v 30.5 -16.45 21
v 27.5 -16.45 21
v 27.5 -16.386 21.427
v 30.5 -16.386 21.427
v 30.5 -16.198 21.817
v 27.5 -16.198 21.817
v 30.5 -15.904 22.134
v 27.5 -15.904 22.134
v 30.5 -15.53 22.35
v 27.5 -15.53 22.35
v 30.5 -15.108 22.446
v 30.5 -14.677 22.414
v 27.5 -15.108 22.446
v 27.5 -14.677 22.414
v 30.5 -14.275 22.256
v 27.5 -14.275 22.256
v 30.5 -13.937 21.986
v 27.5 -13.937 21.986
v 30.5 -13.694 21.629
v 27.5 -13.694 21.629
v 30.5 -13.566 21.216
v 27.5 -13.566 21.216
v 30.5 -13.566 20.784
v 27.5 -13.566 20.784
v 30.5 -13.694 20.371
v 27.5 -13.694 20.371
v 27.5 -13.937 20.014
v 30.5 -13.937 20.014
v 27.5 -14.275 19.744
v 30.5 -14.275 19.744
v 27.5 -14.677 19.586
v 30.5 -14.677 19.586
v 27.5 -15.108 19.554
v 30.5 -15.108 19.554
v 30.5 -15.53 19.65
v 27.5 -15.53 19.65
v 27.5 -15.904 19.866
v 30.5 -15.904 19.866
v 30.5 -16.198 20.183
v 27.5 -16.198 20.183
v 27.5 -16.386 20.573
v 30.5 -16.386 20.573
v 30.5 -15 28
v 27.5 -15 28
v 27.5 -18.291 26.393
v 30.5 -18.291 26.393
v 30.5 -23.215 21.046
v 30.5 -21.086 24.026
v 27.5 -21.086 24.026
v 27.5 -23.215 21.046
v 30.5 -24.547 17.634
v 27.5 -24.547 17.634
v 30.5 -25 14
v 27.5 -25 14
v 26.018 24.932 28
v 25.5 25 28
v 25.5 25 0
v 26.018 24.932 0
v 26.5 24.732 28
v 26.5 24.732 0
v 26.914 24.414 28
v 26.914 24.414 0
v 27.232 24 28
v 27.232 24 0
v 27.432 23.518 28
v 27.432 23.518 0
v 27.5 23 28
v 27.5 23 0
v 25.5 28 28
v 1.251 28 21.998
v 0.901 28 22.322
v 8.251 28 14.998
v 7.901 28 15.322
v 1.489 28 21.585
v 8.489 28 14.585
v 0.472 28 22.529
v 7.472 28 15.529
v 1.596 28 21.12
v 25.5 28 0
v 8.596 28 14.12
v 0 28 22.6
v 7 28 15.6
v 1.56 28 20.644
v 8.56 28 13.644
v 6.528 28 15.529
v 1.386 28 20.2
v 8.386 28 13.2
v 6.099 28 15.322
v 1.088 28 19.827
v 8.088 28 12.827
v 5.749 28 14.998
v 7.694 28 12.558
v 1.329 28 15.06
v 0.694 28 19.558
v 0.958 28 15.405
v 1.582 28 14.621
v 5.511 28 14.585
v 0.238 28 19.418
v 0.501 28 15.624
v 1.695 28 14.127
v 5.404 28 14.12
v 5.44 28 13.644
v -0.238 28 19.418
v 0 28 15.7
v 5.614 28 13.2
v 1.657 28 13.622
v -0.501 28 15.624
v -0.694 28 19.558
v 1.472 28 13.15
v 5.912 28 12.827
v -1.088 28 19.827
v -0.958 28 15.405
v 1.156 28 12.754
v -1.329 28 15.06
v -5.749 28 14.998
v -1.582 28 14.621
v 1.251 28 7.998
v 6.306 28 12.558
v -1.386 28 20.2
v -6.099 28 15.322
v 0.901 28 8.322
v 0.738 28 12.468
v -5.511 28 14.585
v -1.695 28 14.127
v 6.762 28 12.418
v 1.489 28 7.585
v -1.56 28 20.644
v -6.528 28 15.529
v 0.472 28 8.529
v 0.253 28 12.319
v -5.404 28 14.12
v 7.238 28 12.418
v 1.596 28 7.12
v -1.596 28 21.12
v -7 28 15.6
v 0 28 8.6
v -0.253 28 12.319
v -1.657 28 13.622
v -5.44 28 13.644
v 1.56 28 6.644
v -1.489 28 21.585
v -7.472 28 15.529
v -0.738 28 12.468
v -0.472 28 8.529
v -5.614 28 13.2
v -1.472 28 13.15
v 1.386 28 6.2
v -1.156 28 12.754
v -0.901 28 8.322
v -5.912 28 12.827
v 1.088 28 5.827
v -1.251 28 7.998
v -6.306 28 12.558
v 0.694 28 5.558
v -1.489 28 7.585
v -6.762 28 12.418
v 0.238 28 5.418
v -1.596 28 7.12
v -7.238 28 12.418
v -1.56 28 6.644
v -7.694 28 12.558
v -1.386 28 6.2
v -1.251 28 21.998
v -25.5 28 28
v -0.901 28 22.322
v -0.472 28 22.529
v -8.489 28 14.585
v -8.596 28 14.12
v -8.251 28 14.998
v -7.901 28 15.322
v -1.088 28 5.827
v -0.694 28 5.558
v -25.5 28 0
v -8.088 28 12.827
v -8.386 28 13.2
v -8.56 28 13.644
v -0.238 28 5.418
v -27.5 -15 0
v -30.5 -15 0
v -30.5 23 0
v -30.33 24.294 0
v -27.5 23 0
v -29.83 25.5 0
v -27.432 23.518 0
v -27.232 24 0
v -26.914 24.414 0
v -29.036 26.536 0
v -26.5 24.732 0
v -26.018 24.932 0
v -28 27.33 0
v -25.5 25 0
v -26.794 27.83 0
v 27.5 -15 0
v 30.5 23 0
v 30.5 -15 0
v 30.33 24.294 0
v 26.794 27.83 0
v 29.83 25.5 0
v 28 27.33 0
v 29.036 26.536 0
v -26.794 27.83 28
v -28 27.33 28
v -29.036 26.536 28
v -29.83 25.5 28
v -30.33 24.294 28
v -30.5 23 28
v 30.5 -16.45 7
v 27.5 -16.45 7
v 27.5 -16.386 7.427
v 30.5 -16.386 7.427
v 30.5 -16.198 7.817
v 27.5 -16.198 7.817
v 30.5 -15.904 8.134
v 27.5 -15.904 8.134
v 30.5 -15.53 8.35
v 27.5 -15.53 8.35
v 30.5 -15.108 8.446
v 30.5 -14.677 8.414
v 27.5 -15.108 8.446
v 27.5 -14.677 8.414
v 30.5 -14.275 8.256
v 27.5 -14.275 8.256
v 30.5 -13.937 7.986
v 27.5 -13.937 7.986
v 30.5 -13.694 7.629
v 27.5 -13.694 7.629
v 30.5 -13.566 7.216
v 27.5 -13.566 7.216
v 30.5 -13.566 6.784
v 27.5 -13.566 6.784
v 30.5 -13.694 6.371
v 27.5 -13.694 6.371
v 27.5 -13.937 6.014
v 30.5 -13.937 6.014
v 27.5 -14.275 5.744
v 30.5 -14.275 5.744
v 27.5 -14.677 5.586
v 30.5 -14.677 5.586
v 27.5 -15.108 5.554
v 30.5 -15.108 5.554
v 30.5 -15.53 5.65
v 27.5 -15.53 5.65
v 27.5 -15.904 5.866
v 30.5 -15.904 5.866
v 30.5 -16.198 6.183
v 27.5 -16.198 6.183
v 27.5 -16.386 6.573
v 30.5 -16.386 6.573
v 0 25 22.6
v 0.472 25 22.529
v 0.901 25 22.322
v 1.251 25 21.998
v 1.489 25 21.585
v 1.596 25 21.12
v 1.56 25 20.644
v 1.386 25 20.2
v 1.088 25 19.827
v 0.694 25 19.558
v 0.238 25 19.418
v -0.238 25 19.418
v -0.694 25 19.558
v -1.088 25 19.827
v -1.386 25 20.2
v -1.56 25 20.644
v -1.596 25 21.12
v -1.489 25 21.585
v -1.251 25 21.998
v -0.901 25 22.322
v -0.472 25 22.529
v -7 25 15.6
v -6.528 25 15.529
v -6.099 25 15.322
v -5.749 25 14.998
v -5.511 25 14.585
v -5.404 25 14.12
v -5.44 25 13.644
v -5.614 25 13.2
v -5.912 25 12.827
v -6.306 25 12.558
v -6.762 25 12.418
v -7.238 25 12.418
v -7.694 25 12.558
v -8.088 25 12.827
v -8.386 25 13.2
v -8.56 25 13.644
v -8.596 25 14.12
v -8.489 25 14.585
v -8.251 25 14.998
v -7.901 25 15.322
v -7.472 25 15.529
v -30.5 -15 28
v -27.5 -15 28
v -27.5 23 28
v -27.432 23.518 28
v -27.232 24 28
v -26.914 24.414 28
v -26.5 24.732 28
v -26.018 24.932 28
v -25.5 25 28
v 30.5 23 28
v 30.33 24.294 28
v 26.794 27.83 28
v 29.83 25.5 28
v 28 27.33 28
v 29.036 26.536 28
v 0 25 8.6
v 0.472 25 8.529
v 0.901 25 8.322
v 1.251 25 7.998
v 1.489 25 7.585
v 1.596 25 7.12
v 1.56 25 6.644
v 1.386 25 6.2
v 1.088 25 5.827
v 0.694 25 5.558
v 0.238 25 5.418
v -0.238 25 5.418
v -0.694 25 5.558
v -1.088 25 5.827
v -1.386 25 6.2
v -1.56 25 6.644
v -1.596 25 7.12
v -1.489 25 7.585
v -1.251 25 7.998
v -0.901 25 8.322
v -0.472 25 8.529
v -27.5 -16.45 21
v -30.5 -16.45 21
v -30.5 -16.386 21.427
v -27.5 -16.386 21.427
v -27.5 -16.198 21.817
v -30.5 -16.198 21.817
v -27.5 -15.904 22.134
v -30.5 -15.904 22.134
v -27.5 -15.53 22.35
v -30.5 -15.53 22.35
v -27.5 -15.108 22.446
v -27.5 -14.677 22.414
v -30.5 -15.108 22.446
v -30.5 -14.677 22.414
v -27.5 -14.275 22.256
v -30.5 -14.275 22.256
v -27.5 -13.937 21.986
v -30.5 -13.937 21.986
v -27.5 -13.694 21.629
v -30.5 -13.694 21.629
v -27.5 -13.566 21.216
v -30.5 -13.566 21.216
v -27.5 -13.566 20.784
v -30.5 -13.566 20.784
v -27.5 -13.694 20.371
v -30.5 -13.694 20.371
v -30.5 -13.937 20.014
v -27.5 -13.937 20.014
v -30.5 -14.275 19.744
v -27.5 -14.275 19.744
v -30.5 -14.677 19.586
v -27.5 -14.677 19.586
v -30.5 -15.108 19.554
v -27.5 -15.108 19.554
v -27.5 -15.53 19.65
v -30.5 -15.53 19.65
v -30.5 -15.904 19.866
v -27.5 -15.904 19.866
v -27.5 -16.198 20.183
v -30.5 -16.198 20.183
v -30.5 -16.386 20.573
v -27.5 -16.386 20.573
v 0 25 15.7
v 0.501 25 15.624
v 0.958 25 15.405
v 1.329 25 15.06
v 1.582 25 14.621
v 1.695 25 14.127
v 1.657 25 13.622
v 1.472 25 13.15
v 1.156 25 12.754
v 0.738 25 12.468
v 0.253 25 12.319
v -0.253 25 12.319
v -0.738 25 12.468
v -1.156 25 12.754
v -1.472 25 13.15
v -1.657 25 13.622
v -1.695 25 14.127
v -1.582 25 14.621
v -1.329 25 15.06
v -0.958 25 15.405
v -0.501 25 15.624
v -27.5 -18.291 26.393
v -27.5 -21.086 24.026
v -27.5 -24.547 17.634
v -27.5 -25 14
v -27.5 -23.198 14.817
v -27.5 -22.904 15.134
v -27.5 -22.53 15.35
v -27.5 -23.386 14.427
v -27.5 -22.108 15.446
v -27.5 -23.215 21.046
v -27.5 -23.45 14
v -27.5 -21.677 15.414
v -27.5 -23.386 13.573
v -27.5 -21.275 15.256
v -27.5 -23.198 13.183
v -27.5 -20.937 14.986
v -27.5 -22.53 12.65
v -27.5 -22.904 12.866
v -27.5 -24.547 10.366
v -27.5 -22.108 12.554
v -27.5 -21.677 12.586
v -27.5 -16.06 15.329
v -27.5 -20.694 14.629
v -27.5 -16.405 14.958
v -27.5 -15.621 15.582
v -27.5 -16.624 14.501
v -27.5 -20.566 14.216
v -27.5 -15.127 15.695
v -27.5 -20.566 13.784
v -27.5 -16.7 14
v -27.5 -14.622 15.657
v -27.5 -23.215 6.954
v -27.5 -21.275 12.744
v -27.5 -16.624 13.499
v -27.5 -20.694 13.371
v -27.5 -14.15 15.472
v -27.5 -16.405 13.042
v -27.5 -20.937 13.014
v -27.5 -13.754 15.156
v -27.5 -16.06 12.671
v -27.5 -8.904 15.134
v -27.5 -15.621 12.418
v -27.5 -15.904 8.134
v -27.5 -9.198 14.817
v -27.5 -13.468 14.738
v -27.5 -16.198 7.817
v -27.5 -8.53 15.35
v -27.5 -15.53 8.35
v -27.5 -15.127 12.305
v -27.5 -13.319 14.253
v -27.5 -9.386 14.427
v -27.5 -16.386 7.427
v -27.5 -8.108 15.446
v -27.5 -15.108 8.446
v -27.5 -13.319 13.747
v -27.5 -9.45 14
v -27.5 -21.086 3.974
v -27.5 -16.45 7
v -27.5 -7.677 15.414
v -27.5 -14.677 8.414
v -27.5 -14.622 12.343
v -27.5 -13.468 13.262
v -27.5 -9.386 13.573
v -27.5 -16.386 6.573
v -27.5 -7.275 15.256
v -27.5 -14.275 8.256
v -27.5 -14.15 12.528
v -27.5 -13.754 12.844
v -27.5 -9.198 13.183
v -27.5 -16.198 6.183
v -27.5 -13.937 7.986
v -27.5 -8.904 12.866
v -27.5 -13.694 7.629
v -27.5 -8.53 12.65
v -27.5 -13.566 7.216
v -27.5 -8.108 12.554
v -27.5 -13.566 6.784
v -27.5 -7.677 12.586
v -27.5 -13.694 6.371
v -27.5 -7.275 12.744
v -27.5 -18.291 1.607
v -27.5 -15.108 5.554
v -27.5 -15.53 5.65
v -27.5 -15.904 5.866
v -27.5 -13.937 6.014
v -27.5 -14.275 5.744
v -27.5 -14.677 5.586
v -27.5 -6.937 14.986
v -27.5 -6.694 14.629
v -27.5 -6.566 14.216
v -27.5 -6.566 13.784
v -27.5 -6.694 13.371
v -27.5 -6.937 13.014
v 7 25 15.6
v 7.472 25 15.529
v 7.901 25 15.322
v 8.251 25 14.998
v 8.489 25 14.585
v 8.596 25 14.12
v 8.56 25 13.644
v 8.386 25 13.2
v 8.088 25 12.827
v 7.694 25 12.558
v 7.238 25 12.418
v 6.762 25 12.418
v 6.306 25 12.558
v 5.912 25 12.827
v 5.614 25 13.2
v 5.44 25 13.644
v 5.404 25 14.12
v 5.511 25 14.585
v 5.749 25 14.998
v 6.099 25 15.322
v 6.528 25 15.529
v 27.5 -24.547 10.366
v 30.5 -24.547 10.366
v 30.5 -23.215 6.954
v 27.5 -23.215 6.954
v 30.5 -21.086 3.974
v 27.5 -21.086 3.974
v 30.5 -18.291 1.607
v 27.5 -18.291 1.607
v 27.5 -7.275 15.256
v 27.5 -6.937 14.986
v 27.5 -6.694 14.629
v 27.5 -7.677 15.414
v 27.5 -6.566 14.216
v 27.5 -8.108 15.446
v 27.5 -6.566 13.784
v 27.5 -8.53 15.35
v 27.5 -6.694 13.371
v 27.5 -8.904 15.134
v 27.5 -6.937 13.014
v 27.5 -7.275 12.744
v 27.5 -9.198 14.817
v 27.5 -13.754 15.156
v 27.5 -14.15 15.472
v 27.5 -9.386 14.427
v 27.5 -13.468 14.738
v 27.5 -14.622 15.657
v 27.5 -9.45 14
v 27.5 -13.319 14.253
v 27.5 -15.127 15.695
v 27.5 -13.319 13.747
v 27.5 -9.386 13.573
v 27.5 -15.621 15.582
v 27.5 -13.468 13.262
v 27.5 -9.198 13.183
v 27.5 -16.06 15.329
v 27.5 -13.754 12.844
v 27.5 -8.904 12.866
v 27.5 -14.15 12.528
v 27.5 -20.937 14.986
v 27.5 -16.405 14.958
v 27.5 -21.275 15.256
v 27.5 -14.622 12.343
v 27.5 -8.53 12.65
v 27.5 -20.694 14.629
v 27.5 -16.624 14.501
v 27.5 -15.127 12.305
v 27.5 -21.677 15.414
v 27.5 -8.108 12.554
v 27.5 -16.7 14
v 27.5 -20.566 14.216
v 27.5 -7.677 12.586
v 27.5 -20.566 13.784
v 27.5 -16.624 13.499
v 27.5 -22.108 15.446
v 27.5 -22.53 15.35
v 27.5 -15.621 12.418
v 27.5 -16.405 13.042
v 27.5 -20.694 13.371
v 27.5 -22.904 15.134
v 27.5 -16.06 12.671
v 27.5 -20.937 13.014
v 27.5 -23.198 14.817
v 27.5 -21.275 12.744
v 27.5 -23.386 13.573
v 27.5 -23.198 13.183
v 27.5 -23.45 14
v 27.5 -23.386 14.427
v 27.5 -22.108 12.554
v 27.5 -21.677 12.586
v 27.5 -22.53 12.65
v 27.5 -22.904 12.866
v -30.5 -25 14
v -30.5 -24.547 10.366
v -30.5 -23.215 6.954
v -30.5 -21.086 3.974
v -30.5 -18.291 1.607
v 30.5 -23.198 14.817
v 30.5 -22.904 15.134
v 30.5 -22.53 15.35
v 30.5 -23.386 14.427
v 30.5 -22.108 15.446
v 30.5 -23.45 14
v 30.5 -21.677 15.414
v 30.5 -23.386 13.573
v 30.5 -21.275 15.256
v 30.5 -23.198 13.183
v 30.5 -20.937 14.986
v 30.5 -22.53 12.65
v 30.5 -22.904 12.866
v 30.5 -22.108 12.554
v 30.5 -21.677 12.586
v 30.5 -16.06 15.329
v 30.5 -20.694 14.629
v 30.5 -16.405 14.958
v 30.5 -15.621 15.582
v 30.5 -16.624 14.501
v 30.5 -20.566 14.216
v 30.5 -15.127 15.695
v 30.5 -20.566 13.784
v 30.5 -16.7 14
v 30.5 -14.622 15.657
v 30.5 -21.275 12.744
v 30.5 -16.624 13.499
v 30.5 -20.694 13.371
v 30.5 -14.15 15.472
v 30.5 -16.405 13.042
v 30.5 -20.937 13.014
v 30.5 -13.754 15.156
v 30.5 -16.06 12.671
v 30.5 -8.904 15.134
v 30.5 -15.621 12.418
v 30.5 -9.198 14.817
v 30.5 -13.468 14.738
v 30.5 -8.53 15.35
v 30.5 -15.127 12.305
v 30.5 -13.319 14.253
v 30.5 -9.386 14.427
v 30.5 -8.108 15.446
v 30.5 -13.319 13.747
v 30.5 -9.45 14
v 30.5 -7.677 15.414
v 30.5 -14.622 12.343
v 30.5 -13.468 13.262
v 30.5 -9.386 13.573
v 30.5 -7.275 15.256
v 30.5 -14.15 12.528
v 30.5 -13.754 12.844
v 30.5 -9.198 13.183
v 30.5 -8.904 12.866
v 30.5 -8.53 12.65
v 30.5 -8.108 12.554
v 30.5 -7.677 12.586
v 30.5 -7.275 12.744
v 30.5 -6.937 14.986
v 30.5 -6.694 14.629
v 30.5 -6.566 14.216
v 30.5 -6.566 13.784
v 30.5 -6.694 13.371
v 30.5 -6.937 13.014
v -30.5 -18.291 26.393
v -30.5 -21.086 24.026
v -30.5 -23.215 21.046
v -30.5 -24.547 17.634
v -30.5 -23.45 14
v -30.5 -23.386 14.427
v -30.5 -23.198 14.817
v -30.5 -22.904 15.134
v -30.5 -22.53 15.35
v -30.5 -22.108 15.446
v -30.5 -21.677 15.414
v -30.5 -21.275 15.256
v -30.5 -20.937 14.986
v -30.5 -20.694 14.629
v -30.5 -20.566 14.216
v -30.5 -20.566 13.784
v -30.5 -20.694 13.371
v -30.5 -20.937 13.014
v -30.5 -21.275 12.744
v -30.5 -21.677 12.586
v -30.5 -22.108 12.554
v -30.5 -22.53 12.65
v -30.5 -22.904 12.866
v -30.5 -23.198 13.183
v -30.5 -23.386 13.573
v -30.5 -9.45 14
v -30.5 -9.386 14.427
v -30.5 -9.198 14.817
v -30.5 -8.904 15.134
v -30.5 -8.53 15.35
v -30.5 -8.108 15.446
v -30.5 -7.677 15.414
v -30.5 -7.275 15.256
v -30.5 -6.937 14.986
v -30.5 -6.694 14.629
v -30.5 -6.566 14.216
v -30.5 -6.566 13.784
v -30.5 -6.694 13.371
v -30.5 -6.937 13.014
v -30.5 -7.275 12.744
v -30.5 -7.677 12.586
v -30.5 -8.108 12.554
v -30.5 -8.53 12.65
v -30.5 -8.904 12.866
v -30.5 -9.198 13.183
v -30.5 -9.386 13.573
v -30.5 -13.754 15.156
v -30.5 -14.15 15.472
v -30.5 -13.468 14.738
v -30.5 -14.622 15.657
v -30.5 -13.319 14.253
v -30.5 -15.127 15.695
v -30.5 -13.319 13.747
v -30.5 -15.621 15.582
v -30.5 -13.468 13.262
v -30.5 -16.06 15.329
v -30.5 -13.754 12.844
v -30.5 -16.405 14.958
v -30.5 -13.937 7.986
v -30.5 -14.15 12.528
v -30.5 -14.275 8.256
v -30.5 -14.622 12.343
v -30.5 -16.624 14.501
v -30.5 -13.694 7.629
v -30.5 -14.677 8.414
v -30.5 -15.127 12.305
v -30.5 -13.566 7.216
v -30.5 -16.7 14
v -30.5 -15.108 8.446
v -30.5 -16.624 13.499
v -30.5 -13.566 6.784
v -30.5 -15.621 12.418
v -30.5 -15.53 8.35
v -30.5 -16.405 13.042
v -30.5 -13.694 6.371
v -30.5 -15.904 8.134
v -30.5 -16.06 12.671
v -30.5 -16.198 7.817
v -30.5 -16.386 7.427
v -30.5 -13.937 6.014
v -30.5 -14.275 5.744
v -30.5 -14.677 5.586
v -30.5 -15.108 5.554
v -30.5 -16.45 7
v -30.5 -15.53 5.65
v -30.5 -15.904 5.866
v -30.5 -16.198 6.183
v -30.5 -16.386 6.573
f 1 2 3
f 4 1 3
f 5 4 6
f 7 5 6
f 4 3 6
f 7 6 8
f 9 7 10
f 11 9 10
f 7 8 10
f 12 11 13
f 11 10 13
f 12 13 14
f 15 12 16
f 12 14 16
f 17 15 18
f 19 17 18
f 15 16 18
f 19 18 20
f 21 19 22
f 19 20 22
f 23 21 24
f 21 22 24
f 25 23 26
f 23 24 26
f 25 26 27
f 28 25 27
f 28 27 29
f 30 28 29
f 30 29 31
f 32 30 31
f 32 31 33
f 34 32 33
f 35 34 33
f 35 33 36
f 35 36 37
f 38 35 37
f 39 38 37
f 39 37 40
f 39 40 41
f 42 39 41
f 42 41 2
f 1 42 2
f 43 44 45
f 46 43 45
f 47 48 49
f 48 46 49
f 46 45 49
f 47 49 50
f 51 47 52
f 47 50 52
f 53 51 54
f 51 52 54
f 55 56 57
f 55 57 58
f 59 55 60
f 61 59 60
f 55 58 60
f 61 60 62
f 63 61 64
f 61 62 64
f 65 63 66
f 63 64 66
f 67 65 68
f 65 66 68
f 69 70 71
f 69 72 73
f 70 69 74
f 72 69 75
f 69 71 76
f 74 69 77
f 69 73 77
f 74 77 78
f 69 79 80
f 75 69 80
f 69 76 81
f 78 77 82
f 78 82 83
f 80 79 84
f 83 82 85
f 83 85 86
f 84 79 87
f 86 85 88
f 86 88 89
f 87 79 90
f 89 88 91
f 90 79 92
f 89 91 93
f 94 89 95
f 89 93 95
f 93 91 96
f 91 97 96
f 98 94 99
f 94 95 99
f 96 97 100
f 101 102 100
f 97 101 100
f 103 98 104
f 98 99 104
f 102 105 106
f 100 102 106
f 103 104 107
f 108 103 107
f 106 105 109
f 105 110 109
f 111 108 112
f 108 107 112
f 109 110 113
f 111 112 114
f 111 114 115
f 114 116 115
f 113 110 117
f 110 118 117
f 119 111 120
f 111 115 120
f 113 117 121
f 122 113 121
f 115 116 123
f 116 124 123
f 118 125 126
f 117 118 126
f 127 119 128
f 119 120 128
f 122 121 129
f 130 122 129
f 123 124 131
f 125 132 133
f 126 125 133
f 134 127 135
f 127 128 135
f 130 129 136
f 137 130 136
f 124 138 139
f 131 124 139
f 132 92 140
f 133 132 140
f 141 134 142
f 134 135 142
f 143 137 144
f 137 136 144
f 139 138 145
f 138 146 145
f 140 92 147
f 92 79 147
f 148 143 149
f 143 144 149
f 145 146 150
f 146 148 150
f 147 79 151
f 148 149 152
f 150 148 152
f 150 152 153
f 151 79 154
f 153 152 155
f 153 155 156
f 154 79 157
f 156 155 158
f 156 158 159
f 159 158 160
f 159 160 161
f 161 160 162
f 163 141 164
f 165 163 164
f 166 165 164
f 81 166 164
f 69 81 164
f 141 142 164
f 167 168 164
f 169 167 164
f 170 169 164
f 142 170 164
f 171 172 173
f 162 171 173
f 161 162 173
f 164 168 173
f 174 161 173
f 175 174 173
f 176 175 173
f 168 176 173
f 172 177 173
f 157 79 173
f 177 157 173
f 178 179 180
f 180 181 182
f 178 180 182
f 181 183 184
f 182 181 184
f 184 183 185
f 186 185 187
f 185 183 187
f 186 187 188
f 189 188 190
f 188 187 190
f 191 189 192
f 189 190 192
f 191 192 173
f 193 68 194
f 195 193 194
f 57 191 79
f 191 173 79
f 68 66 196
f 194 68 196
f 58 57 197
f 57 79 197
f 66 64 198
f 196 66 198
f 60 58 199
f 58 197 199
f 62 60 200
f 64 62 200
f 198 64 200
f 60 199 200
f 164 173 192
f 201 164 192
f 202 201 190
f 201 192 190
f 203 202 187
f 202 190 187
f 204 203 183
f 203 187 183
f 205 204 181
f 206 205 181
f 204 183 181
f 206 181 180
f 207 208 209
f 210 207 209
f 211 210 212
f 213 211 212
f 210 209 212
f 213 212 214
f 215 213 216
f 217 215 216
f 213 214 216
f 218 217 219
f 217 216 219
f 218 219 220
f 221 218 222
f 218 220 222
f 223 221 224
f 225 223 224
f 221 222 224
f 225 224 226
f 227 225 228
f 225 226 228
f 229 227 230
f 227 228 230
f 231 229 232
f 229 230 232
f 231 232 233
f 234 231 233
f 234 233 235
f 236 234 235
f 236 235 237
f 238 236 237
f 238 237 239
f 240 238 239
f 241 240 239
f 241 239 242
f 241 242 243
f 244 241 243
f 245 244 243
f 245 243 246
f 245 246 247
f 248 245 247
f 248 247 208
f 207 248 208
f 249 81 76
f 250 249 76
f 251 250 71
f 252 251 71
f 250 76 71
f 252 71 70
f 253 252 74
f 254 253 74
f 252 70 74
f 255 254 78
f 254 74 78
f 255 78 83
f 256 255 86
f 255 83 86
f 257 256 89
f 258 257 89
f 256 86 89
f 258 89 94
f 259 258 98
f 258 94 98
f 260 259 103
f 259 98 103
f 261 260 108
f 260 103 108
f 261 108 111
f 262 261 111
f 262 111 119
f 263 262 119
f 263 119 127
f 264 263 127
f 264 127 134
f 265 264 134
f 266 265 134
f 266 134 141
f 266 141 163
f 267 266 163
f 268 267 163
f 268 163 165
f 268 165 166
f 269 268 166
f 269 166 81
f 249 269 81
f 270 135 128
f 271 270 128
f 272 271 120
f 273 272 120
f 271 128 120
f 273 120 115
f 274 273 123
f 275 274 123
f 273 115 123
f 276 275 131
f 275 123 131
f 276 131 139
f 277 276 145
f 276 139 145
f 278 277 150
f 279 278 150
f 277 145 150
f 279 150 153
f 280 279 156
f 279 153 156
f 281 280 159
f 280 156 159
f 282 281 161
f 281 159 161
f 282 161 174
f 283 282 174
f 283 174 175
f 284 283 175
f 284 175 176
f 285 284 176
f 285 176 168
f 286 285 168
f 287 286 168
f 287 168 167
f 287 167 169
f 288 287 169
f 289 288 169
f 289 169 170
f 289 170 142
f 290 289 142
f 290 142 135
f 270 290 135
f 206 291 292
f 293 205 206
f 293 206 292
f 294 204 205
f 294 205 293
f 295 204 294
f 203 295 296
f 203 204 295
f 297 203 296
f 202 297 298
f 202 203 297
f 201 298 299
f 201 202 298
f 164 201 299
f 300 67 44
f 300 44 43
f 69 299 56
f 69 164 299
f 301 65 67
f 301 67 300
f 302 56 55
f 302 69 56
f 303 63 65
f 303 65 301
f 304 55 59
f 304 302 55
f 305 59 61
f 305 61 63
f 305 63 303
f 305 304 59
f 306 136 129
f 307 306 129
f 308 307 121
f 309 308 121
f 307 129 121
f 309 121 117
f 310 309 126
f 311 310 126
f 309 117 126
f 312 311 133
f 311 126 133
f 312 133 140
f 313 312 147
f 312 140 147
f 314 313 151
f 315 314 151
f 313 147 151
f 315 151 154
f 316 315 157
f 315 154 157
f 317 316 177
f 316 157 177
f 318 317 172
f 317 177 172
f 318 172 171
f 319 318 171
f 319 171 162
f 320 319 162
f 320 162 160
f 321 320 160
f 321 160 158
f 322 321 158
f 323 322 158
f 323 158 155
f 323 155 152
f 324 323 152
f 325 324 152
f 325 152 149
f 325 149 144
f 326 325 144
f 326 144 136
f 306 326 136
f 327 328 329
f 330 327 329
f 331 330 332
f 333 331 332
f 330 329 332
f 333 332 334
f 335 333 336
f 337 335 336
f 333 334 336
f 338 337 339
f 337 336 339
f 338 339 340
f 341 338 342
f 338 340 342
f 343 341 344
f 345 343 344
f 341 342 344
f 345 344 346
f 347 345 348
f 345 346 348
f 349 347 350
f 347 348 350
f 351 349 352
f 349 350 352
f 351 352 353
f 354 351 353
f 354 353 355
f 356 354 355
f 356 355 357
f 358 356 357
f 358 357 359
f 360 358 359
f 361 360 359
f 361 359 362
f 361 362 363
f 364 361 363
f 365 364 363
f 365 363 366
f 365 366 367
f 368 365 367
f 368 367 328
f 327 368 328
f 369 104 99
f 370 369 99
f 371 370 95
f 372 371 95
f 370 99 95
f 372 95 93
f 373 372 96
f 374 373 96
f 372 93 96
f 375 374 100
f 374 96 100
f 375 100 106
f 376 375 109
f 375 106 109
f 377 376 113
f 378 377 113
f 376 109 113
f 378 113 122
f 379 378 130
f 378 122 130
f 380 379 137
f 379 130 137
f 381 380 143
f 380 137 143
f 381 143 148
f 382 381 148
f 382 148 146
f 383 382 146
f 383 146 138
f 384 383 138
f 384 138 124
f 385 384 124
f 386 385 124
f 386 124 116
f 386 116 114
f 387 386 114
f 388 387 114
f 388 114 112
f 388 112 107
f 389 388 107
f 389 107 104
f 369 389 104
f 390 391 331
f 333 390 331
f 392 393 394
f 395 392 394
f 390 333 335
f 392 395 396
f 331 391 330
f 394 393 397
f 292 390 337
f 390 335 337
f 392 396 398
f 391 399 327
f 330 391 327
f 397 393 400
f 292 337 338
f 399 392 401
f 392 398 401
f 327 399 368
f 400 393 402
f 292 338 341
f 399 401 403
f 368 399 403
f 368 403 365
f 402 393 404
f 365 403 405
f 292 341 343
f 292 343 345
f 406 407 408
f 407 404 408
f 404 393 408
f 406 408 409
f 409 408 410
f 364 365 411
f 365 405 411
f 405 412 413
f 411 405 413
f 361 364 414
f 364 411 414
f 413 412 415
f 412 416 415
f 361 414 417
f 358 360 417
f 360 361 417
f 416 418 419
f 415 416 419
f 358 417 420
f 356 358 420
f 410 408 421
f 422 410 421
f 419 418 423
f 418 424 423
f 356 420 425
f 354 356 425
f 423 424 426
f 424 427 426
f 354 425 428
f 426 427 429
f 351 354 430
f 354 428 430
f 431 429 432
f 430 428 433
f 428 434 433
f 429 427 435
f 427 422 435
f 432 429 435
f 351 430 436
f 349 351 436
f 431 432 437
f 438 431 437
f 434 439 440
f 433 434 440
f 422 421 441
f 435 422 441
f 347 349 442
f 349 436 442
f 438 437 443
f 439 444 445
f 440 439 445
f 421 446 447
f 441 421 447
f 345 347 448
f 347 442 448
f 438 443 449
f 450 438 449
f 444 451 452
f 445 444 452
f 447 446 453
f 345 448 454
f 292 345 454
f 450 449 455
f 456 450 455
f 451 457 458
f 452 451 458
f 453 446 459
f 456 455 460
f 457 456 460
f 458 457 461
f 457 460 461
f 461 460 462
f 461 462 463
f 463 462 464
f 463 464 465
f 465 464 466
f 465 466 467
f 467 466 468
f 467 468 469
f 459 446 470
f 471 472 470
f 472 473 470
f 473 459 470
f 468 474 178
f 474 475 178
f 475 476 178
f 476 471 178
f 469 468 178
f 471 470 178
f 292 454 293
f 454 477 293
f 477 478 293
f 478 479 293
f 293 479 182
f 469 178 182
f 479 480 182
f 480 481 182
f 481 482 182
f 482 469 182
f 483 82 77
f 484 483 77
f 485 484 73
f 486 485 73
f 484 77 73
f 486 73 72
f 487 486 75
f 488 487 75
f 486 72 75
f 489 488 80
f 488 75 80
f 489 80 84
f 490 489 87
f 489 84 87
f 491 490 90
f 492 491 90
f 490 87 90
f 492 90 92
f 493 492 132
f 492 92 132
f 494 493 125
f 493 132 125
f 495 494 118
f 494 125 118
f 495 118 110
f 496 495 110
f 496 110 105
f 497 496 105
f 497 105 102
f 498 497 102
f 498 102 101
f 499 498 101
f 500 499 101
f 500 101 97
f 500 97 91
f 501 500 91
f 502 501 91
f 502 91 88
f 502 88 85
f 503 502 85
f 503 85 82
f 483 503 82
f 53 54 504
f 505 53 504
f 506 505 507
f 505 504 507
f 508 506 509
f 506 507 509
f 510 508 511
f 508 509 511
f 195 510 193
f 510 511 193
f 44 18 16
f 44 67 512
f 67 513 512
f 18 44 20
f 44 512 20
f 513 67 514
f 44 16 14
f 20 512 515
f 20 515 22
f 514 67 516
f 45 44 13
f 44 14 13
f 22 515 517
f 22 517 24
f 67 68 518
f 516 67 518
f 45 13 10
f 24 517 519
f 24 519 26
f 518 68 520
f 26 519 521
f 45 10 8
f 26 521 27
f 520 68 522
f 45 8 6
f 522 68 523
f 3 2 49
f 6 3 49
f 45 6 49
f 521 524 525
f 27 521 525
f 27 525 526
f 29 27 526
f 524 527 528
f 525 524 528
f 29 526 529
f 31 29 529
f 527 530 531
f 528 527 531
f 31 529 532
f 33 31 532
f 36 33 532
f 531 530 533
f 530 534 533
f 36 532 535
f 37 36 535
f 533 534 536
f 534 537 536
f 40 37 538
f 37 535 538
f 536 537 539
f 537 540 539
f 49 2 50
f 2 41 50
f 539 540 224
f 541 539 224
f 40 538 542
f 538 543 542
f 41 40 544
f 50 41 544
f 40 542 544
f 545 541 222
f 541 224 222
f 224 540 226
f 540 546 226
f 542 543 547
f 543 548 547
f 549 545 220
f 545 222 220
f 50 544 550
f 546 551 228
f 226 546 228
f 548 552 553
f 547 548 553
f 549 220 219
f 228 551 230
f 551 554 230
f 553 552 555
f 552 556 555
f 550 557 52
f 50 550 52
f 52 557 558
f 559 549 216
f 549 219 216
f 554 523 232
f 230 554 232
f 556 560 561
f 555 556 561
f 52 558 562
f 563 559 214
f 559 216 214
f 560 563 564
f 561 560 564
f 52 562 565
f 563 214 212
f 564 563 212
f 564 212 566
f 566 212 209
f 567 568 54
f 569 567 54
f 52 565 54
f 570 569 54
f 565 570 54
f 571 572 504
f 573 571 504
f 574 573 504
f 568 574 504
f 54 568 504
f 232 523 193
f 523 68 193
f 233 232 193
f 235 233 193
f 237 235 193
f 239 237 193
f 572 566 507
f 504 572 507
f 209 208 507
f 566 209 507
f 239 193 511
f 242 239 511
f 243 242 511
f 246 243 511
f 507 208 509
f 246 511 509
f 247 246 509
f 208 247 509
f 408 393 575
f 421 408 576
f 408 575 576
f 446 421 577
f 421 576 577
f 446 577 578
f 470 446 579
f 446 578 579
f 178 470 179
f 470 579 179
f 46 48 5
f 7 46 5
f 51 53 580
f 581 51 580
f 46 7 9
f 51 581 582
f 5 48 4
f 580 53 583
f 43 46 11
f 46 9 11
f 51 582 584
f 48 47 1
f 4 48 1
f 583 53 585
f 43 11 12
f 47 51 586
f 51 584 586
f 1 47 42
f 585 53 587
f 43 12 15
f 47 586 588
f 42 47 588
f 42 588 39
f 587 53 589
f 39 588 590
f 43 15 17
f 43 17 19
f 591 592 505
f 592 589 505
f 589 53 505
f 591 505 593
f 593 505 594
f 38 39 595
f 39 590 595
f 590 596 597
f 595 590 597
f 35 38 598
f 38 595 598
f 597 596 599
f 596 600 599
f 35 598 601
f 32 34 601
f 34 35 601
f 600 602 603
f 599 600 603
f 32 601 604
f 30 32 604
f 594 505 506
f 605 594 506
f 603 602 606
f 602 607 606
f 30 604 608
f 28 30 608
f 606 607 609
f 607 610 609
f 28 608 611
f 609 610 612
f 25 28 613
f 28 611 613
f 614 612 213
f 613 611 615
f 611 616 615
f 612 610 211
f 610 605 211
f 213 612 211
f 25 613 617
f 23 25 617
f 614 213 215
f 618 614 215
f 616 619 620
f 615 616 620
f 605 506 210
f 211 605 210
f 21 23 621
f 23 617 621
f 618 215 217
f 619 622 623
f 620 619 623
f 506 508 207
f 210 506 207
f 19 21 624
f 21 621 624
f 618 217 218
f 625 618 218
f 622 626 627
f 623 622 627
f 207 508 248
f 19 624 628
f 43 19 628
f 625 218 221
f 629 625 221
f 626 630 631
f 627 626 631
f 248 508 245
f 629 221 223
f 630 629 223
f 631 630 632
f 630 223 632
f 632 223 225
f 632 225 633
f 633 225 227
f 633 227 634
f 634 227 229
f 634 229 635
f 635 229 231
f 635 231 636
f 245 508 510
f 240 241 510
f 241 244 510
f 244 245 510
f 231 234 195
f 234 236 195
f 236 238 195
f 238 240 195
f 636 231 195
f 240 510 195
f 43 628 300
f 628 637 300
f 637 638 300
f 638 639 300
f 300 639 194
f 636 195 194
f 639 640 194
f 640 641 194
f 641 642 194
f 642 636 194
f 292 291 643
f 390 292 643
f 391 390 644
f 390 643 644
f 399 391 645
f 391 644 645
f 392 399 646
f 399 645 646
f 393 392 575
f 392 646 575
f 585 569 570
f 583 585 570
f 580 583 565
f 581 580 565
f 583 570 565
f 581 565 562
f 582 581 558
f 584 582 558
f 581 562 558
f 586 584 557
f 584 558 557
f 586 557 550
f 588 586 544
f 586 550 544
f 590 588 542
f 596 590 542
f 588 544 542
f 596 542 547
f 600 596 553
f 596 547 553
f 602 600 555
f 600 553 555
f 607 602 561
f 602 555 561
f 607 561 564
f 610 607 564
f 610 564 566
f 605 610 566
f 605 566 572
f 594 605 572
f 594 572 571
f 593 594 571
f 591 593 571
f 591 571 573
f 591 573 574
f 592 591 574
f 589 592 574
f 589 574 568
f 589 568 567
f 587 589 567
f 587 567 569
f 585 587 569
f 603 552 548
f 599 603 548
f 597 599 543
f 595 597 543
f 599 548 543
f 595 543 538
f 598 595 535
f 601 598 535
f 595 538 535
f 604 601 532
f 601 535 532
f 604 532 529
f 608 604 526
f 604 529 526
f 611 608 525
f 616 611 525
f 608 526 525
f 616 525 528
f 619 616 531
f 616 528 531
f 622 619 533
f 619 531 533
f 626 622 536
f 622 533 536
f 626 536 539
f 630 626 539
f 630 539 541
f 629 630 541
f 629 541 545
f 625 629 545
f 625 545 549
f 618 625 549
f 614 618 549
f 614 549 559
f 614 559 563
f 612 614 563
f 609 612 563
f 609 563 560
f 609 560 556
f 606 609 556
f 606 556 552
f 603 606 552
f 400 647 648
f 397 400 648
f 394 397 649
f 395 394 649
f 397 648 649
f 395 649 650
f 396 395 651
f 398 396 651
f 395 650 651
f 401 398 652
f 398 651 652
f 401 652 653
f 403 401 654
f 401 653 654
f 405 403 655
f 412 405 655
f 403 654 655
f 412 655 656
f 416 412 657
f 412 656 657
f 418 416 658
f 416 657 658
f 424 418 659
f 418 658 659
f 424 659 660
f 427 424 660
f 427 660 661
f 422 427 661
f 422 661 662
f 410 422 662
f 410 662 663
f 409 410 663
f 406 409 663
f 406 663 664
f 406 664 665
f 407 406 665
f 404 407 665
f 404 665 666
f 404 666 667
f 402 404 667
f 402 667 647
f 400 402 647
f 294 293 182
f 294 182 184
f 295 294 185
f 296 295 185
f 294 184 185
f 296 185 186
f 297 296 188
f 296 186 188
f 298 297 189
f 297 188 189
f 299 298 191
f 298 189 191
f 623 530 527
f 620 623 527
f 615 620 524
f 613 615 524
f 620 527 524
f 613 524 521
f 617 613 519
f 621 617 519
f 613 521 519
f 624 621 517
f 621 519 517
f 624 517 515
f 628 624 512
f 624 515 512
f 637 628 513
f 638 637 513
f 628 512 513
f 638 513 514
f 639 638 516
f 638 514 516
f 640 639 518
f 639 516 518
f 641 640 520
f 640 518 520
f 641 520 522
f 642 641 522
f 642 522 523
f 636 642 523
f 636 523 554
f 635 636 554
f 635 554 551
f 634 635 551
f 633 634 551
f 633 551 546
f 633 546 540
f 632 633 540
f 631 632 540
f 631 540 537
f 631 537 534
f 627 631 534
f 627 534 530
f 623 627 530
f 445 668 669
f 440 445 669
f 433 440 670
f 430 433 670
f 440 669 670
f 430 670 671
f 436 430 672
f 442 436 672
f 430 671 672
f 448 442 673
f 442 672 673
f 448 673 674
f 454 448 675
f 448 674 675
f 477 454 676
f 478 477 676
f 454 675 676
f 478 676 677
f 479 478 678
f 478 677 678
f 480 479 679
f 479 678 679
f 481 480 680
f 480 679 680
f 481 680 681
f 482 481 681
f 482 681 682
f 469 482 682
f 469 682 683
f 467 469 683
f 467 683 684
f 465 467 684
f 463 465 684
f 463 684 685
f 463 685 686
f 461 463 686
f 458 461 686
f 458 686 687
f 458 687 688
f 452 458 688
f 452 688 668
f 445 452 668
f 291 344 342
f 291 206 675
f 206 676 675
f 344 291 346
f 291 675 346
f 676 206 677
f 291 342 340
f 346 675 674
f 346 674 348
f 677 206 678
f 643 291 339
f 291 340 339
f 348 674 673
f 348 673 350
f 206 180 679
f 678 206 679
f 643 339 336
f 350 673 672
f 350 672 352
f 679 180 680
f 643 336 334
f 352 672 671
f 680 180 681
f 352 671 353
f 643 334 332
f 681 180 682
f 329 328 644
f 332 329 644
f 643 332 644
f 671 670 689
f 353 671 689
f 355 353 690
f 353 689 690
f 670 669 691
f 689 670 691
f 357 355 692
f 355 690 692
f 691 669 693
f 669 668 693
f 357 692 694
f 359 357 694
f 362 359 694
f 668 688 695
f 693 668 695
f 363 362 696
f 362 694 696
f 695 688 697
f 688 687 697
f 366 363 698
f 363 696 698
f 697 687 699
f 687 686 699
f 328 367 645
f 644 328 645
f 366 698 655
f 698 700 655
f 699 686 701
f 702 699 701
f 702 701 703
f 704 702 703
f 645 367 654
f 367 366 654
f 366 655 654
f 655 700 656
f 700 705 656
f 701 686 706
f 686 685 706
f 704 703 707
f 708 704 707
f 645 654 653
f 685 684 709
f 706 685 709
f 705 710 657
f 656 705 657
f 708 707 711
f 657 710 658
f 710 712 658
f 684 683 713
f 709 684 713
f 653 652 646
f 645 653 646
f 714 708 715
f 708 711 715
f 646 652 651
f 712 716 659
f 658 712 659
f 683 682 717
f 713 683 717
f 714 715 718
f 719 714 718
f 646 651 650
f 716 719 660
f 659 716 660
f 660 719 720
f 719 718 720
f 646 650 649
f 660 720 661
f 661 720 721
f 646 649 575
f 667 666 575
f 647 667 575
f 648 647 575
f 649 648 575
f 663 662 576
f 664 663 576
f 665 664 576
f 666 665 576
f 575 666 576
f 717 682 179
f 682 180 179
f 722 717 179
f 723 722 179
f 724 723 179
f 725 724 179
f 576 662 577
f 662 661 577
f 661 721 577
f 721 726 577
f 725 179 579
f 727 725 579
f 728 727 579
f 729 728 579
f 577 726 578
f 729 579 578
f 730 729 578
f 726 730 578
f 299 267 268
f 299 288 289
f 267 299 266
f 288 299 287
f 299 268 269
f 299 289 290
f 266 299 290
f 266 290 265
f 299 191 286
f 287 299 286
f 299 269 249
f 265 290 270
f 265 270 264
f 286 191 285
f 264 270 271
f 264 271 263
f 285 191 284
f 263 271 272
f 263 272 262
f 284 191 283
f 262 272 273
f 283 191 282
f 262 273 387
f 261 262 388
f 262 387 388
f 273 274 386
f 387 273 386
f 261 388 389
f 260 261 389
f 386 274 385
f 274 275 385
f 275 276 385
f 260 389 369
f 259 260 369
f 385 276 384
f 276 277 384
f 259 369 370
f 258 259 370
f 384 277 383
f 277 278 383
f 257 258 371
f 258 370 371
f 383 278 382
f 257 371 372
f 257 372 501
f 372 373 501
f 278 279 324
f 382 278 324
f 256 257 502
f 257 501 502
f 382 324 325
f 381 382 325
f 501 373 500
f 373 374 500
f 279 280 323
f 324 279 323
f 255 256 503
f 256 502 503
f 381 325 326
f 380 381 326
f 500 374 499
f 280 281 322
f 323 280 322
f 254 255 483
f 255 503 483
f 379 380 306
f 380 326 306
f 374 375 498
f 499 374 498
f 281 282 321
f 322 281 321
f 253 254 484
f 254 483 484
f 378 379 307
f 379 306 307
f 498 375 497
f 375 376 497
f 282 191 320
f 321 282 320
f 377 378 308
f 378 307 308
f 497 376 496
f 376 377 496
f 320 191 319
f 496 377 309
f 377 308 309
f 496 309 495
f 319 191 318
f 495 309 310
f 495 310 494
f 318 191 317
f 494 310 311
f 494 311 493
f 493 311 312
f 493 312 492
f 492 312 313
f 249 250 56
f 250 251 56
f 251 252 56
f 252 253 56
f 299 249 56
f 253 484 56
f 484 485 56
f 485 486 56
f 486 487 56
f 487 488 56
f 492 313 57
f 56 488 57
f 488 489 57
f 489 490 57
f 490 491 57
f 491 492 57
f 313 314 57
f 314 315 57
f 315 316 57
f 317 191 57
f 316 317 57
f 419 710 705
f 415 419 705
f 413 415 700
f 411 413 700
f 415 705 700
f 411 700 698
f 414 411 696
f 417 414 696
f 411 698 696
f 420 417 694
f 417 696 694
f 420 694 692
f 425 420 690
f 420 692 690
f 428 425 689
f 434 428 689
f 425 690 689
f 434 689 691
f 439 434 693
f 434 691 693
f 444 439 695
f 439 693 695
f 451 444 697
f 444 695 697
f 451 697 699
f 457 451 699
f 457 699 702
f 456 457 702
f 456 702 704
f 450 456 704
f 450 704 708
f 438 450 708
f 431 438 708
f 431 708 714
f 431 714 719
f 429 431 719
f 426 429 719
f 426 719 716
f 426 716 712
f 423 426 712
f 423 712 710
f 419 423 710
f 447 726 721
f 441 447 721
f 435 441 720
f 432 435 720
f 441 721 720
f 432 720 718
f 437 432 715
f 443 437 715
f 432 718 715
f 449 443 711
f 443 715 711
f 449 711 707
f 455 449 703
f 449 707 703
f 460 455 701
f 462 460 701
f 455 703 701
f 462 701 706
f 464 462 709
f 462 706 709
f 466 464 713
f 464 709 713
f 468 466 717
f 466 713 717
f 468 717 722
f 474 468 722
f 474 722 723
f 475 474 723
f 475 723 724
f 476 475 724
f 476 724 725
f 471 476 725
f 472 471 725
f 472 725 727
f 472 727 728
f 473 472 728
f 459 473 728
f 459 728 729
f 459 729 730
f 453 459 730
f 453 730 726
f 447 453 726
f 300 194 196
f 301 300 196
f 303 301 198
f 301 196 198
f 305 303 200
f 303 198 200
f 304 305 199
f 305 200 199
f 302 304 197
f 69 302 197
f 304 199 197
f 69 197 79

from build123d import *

# Parameters (mm, degrees)
SM_BASE_FLANGE_2_DEPTH = 28
SKETCH_10_R            = 1.45
SKETCH_10_R_2          = 1.7
CUT_EXTRUDE_1_DEPTH    = 73.725511342
SKETCH_12_R            = 1.6
SKETCH_12_R_2          = 1.7
CUT_EXTRUDE_3_DEPTH    = 4


# Sheet-metal steps are written as plain solids
with BuildPart() as part:
    # 草图1 → 基体-法兰2 (new body)
    with BuildSketch(Plane.XY):
        with BuildLine():
            Line((-27.5, -25), (-27.5, 23))
            ThreePointArc((-27.5, 23), (-26.914213562, 24.414213562), (-25.5, 25))
            Line((-25.5, 25), (25.5, 25))
            ThreePointArc((25.5, 25), (26.914213562, 24.414213562), (27.5, 23))
            Line((27.5, 23), (27.5, -25))
            Line((27.5, -25), (30.5, -25))
            Line((30.5, -25), (30.5, 23))
            ThreePointArc((30.5, 23), (29.035533906, 26.535533906), (25.5, 28))
            Line((25.5, 28), (-25.5, 28))
            ThreePointArc((-25.5, 28), (-29.035533906, 26.535533906), (-30.5, 23))
            Line((-30.5, 23), (-30.5, -25))
            Line((-30.5, -25), (-27.5, -25))
        make_face()
    extrude(amount=SM_BASE_FLANGE_2_DEPTH)

    # 草图10 → 切除-拉伸1 (cut, through all)
    with BuildSketch(Plane.ZY.offset(30.5)):
        with Locations(Location((7, -15, 0), (0, 0, 270))):
            Circle(SKETCH_10_R)
        with Locations(Location((14, -15, 0), (0, 0, 270))):
            Circle(SKETCH_10_R_2)
        with Locations(Location((21, -15, 0), (0, 0, 270))):
            Circle(SKETCH_10_R)
        with Locations(Location((14, -8, 0), (0, 0, 270))):
            Circle(SKETCH_10_R)
        with Locations(Location((14, -22, 0), (0, 0, 270))):
            Circle(SKETCH_10_R)
        with BuildLine():
            Line((0, -25), (14, -25))
            ThreePointArc((14, -25), (5.397674733, -22.243255374), (0, -15))
            Line((0, -15), (0, -25))
        make_face()
        with BuildLine():
            ThreePointArc((28, -15), (22.602325267, -22.243255374), (14, -25))
            Line((14, -25), (28, -25))
            Line((28, -25), (28, -15))
        make_face()
    extrude(amount=-CUT_EXTRUDE_1_DEPTH, mode=Mode.SUBTRACT)

    # 草图12 → 切除-拉伸3 (cut)
    with BuildSketch(Plane(origin=(0, 28, 0), x_dir=(1, 0, 0), z_dir=(0, 1, 0))):
        with Locations(Location((-7, -14, 0), (0, 0, 270))):
            Circle(SKETCH_12_R)
        with Locations(Location((0, -7, 0), (0, 0, 270))):
            Circle(SKETCH_12_R)
        with Locations(Location((7, -14, 0), (0, 0, 270))):
            Circle(SKETCH_12_R)
        with Locations(Location((0, -14, 0), (0, 0, 270))):
            Circle(SKETCH_12_R_2)
        with Locations(Location((0, -21, 0), (0, 0, 270))):
            Circle(SKETCH_12_R)
    extrude(amount=-CUT_EXTRUDE_3_DEPTH, mode=Mode.SUBTRACT)


solid = part.part
